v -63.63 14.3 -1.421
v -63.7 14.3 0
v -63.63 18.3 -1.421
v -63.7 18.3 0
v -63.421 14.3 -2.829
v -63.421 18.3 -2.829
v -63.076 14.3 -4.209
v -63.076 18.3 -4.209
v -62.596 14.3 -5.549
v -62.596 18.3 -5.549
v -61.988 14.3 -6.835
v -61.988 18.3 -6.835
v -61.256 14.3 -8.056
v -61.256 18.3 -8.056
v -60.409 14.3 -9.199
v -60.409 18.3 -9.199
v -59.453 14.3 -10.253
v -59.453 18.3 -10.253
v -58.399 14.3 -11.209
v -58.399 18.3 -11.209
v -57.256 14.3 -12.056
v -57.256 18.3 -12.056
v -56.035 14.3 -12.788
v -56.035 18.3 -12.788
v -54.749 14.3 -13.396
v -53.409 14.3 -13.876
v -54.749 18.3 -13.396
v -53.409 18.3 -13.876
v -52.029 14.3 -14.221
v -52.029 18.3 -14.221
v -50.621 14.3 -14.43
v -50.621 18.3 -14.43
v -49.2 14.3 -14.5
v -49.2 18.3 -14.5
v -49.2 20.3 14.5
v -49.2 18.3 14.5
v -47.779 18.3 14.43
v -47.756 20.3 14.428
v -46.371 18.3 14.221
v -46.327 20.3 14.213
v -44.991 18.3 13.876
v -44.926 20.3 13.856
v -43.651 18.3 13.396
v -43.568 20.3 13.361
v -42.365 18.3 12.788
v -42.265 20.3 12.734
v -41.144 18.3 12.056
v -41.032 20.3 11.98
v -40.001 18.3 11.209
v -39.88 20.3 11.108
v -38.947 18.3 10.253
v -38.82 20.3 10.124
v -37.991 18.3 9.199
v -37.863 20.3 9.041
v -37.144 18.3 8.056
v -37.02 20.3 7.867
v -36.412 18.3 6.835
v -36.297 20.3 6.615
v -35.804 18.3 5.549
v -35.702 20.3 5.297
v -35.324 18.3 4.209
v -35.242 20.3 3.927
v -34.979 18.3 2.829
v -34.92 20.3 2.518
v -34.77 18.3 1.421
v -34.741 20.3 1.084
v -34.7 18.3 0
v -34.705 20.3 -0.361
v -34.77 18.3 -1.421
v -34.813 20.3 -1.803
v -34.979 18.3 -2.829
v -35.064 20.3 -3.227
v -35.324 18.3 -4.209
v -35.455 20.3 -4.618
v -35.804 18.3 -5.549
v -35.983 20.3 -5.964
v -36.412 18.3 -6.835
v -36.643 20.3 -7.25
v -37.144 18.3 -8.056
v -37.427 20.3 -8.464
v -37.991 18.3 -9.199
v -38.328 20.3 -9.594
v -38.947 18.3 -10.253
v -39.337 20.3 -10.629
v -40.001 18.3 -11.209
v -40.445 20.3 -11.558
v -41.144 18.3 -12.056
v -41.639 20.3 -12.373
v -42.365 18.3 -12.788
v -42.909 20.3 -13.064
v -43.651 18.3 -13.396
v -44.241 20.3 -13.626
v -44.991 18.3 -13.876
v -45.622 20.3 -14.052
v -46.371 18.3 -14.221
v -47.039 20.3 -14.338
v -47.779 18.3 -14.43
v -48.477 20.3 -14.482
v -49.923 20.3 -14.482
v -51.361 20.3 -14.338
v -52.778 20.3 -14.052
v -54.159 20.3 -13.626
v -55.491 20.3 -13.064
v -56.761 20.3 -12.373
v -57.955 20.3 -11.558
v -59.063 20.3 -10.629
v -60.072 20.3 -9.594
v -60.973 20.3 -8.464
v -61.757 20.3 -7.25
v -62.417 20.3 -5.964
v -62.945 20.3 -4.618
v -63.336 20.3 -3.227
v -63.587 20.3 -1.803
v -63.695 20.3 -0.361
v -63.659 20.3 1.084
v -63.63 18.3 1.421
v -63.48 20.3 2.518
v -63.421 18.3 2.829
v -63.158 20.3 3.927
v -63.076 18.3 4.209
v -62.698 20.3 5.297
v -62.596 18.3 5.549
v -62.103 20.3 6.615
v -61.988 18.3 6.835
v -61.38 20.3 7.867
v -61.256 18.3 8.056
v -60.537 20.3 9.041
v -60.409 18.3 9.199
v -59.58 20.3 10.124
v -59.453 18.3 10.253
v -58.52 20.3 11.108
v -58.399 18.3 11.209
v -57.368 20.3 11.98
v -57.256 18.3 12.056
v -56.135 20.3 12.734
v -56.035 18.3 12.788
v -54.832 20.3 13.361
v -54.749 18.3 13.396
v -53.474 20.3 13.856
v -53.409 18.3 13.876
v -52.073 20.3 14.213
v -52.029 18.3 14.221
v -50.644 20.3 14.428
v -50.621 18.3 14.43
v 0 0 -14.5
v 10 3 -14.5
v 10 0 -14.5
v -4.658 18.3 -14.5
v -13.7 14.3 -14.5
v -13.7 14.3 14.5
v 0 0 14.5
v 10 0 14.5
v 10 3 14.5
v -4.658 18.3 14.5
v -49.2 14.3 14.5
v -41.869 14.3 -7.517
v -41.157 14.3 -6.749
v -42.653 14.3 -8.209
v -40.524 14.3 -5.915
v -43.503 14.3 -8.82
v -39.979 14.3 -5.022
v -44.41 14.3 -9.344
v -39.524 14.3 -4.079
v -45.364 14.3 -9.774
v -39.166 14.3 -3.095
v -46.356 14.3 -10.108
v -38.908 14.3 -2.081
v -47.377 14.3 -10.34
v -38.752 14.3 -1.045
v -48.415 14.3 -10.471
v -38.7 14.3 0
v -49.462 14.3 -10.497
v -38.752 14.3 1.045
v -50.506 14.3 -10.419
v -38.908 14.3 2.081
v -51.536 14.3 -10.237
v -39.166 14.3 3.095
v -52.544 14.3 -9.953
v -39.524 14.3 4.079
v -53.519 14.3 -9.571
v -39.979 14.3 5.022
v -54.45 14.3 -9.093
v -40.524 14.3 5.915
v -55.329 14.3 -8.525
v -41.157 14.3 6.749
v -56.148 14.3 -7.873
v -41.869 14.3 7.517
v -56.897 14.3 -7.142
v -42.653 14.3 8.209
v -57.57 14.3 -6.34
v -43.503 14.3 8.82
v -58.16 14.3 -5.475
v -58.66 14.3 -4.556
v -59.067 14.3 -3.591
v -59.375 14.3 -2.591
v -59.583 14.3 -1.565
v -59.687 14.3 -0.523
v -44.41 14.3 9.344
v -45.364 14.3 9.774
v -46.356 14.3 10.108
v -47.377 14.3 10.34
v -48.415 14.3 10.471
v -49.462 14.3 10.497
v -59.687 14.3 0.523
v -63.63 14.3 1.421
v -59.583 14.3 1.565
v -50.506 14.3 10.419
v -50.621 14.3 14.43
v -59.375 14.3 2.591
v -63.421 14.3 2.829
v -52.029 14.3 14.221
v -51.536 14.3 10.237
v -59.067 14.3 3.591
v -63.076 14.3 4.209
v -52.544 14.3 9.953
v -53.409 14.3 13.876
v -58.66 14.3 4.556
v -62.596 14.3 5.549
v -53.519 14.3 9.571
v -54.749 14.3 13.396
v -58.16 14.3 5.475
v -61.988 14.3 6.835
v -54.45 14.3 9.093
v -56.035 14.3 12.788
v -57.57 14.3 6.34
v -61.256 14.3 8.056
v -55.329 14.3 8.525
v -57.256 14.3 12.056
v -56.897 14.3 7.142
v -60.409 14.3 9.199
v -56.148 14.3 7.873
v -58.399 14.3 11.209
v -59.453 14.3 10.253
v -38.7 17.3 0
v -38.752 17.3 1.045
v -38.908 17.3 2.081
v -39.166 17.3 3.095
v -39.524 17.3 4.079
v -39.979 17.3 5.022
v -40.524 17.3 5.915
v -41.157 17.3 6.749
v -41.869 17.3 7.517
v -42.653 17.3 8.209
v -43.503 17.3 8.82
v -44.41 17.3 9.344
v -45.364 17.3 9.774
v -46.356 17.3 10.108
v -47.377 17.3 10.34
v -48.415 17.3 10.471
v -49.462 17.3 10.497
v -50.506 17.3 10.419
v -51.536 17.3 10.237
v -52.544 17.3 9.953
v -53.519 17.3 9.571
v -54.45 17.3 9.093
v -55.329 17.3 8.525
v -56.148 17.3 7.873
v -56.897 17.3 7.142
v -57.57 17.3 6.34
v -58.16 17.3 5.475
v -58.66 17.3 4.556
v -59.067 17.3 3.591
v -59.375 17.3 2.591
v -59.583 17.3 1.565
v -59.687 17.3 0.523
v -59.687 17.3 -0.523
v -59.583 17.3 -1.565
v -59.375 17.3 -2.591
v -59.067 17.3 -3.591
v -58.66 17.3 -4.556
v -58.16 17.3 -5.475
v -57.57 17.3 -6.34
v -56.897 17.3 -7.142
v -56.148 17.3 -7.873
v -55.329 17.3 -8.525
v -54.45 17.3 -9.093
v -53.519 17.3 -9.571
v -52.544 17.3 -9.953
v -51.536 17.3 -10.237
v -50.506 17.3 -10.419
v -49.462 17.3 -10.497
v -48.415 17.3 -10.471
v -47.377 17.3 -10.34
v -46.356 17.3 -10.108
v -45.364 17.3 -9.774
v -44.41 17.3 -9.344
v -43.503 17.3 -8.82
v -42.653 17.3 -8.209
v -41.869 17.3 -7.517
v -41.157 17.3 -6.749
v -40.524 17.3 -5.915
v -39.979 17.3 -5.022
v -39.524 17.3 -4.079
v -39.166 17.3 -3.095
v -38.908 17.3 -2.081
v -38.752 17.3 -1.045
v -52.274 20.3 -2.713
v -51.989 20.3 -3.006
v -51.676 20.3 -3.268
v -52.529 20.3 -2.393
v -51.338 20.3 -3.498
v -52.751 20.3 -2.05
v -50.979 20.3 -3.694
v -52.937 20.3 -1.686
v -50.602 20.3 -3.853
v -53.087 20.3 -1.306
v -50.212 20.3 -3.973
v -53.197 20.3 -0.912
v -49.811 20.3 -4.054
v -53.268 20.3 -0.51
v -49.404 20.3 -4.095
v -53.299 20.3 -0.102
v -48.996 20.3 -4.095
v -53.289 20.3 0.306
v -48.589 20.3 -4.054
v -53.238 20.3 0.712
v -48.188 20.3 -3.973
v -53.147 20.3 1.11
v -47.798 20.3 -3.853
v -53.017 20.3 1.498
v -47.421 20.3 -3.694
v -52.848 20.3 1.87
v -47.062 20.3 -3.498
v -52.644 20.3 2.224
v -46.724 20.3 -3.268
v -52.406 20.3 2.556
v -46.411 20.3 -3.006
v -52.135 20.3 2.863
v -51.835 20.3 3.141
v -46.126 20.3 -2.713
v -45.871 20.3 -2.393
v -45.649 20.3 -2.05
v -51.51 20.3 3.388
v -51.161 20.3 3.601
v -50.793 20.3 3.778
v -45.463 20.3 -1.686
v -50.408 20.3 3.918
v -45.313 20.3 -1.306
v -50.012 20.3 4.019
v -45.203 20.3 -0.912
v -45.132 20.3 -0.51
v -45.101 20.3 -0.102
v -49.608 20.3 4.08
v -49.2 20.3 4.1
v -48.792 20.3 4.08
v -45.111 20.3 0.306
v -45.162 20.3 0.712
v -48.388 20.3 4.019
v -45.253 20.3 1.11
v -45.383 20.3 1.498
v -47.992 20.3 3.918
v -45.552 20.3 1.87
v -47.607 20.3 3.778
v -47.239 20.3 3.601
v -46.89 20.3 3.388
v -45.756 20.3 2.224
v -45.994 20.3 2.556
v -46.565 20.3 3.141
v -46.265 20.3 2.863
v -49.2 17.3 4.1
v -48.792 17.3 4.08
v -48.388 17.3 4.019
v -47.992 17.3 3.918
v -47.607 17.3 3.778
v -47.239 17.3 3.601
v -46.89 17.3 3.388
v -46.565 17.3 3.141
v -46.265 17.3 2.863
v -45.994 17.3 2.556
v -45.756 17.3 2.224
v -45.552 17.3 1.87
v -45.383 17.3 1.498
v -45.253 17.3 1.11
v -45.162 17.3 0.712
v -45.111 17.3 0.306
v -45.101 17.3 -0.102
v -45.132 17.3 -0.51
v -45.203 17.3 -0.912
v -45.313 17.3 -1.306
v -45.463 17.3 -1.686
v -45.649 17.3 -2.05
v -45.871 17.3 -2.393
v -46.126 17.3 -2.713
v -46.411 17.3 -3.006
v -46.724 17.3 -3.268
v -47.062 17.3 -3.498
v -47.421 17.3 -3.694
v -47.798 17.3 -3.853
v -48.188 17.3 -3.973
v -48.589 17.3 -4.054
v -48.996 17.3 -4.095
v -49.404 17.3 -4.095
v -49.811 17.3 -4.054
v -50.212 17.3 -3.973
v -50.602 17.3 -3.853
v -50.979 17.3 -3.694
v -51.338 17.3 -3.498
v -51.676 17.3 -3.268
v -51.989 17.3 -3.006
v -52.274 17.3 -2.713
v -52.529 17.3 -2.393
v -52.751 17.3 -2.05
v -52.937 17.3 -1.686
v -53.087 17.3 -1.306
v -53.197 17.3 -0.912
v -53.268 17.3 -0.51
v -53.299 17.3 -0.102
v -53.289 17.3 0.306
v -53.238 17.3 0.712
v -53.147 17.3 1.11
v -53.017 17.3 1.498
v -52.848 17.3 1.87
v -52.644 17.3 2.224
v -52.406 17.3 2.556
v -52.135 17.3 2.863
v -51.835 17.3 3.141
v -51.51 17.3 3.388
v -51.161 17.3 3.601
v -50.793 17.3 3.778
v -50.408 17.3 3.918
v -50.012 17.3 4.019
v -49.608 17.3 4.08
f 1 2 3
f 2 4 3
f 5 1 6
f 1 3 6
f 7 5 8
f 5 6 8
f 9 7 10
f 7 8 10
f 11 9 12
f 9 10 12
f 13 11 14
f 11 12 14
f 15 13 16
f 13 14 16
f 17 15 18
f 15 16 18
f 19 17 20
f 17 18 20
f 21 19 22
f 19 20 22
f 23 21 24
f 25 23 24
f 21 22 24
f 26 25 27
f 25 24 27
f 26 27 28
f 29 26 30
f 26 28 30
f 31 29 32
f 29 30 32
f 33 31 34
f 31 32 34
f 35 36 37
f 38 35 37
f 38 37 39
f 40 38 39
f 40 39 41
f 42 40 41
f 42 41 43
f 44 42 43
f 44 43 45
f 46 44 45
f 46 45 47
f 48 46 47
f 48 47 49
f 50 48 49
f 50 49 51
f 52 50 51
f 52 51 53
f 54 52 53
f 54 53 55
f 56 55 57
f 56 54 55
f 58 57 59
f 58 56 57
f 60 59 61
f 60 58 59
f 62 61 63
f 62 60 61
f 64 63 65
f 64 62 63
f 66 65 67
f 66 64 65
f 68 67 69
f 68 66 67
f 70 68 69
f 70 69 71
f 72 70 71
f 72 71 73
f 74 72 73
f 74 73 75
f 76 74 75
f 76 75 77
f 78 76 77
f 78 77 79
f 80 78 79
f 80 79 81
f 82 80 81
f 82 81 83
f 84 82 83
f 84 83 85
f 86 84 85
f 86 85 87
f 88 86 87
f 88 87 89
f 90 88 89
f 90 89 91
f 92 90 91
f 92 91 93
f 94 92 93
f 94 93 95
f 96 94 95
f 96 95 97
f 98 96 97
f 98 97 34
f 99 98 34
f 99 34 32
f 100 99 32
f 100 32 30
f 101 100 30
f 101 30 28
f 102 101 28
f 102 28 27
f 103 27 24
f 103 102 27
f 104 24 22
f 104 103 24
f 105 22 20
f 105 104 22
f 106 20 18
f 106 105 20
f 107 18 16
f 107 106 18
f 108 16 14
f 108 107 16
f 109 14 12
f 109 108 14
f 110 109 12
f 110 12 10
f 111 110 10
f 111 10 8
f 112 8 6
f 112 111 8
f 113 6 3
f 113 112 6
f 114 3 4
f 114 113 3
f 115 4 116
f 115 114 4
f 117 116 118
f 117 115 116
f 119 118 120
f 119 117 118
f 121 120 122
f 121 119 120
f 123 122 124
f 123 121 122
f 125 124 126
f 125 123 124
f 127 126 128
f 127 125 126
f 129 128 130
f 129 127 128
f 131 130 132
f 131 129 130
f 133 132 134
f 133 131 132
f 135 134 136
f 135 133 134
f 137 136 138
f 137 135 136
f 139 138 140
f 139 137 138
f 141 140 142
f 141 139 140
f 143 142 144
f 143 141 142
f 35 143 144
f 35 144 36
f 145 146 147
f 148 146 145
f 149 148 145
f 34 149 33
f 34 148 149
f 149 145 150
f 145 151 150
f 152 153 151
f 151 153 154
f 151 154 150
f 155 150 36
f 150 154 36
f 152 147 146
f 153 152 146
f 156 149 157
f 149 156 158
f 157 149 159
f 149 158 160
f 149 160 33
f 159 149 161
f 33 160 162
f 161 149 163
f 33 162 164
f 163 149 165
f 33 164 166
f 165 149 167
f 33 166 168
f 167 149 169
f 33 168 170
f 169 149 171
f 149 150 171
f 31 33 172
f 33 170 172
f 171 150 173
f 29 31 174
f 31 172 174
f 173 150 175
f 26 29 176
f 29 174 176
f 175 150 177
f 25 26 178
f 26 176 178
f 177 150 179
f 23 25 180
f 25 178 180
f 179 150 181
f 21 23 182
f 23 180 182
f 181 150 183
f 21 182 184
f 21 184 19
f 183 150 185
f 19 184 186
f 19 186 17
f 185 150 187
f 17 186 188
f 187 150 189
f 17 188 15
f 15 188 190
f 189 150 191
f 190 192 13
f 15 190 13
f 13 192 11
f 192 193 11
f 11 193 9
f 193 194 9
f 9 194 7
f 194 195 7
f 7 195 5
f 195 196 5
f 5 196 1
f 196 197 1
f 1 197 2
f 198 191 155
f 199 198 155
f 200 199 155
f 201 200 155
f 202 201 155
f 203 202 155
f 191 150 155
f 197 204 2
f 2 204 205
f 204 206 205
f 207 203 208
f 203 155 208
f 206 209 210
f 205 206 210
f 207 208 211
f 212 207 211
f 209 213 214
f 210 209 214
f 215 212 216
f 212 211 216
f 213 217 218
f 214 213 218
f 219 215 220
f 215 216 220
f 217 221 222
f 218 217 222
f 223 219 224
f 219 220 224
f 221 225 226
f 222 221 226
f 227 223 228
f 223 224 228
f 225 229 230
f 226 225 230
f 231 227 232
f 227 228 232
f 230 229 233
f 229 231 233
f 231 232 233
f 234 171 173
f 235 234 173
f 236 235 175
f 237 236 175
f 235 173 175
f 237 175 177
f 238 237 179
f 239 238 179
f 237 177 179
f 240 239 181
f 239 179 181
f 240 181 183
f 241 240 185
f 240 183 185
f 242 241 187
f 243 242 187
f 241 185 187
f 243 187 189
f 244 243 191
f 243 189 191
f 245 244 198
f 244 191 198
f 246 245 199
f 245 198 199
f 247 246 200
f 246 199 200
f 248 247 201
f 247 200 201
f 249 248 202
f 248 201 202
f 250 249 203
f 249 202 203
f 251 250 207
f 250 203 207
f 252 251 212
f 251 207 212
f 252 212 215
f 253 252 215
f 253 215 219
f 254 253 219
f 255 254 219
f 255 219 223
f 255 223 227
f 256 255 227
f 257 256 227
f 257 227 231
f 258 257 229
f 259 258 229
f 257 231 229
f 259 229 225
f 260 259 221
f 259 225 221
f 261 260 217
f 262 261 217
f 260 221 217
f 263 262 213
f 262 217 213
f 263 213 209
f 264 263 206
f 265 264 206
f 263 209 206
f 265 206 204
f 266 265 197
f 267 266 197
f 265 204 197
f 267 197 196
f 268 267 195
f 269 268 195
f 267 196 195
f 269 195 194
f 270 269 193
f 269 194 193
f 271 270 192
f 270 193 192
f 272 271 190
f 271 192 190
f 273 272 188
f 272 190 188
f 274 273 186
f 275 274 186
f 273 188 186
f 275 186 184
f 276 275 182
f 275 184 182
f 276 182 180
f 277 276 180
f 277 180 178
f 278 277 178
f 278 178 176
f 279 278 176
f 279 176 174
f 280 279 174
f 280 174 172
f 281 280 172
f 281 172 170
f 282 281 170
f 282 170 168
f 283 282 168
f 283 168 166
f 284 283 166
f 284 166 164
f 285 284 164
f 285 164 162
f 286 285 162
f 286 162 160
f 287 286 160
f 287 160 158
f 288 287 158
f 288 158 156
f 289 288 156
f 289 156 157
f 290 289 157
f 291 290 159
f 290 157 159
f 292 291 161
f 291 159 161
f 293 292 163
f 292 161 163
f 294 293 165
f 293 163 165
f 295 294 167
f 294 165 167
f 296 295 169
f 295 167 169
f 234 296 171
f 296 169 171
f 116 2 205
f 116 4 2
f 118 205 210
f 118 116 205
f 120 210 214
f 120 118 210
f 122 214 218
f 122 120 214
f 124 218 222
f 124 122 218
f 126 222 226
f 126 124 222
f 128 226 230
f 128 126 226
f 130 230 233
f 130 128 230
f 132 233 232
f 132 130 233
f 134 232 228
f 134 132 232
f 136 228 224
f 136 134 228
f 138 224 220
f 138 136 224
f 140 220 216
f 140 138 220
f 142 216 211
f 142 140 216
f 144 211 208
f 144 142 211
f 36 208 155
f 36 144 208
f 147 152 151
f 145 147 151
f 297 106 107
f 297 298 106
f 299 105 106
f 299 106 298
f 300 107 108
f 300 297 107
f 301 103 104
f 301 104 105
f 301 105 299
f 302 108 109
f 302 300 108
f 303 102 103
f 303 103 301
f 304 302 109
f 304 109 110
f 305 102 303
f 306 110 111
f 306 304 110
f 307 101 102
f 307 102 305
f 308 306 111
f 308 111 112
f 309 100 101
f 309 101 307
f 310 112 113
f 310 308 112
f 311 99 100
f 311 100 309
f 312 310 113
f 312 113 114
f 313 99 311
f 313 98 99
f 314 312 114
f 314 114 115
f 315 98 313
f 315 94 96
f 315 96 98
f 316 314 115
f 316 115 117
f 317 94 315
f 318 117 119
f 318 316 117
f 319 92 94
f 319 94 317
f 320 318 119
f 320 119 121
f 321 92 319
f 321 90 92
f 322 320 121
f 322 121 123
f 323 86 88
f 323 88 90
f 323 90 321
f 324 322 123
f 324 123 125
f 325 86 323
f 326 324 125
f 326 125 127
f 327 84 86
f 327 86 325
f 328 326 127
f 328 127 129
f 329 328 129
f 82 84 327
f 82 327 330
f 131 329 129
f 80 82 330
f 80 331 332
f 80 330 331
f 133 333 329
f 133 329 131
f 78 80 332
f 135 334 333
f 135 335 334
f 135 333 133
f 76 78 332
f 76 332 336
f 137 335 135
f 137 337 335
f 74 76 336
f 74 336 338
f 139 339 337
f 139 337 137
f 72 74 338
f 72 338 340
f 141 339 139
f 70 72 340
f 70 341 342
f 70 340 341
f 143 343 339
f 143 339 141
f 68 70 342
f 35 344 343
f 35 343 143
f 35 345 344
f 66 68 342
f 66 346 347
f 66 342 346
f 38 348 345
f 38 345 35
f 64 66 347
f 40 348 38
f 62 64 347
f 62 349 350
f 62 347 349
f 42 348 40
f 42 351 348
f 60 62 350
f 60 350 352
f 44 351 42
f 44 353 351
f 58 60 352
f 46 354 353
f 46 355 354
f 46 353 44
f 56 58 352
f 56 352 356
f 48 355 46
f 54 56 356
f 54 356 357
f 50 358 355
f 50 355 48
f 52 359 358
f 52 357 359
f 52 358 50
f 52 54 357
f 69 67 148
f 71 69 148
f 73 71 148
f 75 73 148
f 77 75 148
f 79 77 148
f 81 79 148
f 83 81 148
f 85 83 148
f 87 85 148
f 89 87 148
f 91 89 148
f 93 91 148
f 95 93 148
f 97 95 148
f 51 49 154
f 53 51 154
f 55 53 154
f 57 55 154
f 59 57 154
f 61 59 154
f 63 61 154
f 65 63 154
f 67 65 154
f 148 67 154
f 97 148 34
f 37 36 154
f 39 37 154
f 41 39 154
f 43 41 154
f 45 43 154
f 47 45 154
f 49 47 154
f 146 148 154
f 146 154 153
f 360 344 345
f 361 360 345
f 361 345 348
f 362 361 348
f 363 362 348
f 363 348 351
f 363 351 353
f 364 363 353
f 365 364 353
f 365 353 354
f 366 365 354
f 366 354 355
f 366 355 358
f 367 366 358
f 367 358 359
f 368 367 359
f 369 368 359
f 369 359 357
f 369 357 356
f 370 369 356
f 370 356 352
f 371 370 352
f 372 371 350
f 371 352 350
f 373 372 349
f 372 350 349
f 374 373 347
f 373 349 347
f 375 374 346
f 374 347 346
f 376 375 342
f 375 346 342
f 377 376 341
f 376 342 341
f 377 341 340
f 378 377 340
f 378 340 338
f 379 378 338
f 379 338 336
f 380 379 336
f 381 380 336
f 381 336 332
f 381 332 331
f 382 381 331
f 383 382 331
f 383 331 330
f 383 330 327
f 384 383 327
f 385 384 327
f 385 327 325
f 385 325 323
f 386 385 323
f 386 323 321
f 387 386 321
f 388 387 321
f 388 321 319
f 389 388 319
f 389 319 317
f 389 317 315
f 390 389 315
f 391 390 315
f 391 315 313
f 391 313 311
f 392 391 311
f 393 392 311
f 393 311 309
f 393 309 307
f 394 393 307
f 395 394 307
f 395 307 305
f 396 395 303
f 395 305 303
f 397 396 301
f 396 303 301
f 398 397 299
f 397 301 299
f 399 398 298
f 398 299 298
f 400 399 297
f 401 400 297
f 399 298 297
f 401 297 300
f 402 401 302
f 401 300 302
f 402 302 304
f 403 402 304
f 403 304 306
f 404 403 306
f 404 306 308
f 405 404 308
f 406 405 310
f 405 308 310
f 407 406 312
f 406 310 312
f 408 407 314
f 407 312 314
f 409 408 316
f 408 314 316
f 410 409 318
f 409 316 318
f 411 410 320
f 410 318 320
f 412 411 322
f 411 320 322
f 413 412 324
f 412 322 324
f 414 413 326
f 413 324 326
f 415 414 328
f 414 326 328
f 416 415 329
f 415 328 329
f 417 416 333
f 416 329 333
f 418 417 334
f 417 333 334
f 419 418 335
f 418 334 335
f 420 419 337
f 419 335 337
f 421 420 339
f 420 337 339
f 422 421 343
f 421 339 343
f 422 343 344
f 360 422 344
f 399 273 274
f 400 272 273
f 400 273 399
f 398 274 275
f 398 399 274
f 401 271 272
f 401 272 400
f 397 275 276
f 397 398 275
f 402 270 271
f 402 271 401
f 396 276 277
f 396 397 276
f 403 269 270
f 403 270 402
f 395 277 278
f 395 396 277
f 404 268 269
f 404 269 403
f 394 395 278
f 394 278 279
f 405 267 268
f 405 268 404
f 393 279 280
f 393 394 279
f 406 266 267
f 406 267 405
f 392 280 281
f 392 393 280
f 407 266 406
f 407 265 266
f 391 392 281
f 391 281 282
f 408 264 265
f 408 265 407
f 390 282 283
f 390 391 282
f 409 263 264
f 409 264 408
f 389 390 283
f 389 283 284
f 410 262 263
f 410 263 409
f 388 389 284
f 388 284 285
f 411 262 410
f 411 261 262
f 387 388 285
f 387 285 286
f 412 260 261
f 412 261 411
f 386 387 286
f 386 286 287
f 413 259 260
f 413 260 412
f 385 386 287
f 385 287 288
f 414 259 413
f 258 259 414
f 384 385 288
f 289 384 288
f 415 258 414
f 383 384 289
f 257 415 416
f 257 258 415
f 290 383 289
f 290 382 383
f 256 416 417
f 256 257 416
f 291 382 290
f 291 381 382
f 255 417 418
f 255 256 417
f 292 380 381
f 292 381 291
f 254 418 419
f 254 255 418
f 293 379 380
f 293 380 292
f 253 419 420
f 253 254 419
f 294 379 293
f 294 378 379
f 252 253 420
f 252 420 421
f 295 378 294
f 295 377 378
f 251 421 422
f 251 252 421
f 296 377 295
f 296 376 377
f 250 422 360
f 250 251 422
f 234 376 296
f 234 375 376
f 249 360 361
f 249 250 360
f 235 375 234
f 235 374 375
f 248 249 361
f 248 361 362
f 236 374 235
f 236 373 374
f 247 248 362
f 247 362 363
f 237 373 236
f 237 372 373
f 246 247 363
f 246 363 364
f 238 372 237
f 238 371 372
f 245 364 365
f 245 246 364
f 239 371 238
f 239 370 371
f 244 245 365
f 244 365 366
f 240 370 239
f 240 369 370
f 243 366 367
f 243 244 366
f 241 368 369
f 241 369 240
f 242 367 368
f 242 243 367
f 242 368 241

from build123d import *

# Parameters (mm, degrees)
BOSS_EXTRUDE1_DEPTH = 14.5
SKETCH3_R           = 4.1
CUT_EXTRUDE1_DEPTH  = 4
BOSS_EXTRUDE2_START = 2
SKETCH5_R           = 14.5
SKETCH5_R_2         = 4.1
BOSS_EXTRUDE2_DEPTH = 2
SKETCH6_R           = 1.55
CUT_EXTRUDE3_DEPTH  = 3
SKETCH7_R           = 10.5
CUT_EXTRUDE4_DEPTH  = 3
FILLET1_R           = 14.5
CUT_EXTRUDE5_DEPTH  = 3
SKETCH9_R           = 1.55
CUT_EXTRUDE6_DEPTH  = 3
SKETCH10_R          = 3
CUT_EXTRUDE7_DEPTH  = 2
SKETCH13_W          = 33
SKETCH13_H          = 3
CUT_EXTRUDE8_DEPTH  = 29


with BuildPart() as part:
    # Sketch2 → Boss-Extrude1 (new, symmetric)
    with BuildSketch(Plane.XY):
        Polygon((-63.7, 18.3), (-4.658041958, 18.3), (10, 3), (43, 3), (43, 0), (0, 0), (-13.7, 14.3), (-63.7, 14.3), align=None)
    extrude(amount=BOSS_EXTRUDE1_DEPTH, both=True)

    # Sketch3 → Cut-Extrude1 (cut)
    with BuildSketch(Plane(origin=(0, 18.3, 0), x_dir=(1, 0, 0), z_dir=(0, 1, 0))):
        with Locations(Location((-49.2, 0, 0), (0, 0, 270))):
            Circle(SKETCH3_R)
    extrude(amount=-CUT_EXTRUDE1_DEPTH, mode=Mode.SUBTRACT)

    # Sketch5 → Boss-Extrude2 (add)
    with BuildSketch(Plane(origin=(0, 18.3, 0), x_dir=(1, 0, 0), z_dir=(0, 1, 0)).offset(BOSS_EXTRUDE2_START)):
        with Locations(Location((-49.2, 0, 0), (0, 0, 270))):
            Circle(SKETCH5_R)
        with Locations(Location((-49.2, 0, 0), (0, 0, 270))):
            Circle(SKETCH5_R_2, mode=Mode.SUBTRACT)
    extrude(amount=-BOSS_EXTRUDE2_DEPTH)

    # Sketch6 → Cut-Extrude3 (cut)
    with BuildSketch(Plane(origin=(0, 3, 0), x_dir=(1, 0, 0), z_dir=(0, 1, 0))):
        with Locations(Location((22.248092992, -5.560176775, 0), (0, 0, 180))):
            Circle(SKETCH6_R)
        with Locations(Location((33.751907008, 5.560176775, 0), (0, 0, 180))):
            Circle(SKETCH6_R)
    extrude(amount=-CUT_EXTRUDE3_DEPTH, mode=Mode.SUBTRACT)

    # Sketch7 → Cut-Extrude4 (cut)
    with BuildSketch(Plane.XZ.offset(-14.3)):
        with Locations((-49.2, 0)):
            Circle(SKETCH7_R)
    extrude(amount=-CUT_EXTRUDE4_DEPTH, mode=Mode.SUBTRACT)

    # Fillet1
    fillet1_edges = [part.edges().sort_by_distance(p)[0] for p in [
        (-63.7, 16.3, -14.5),
        (-63.7, 16.3, 14.5),
    ]]
    fillet(fillet1_edges, radius=FILLET1_R - 0.0001)  # a hair under: the kernel refuses the full size

    # Sketch8 → Cut-Extrude5 (cut)
    with BuildSketch(Plane(origin=(0, 3, 0), x_dir=(1, 0, 0), z_dir=(0, 1, 0))):
        Polygon((16, -3.5), (10, -14.5), (16, -14.5), (43, -14.5), (43, -3.5), align=None)
    extrude(amount=-CUT_EXTRUDE5_DEPTH, mode=Mode.SUBTRACT)

    # Sketch9 → Cut-Extrude6 (cut)
    with BuildSketch(Plane(origin=(0, 3, 0), x_dir=(1, 0, 0), z_dir=(0, 1, 0))):
        with Locations(Location((22.251907008, 5.560176775, 0), (0, 0, 270))):
            Circle(SKETCH9_R)
    extrude(amount=-CUT_EXTRUDE6_DEPTH, mode=Mode.SUBTRACT)

    # Sketch10 → Cut-Extrude7 (cut)
    with BuildSketch(Plane.XZ):
        with Locations((22.251907008, -5.560176775)):
            Circle(SKETCH10_R)
        with Locations((33.751907008, -5.560176775)):
            Circle(SKETCH10_R)
    extrude(amount=-CUT_EXTRUDE7_DEPTH, mode=Mode.SUBTRACT)

    # Sketch13 → Cut-Extrude8 (cut)
    with BuildSketch(Plane(origin=(0, 0, -14.5), x_dir=(-1, 0, 0), z_dir=(0, 0, -1))):
        with Locations((-26.5, 1.5)):
            Rectangle(SKETCH13_W, SKETCH13_H)
    extrude(amount=-CUT_EXTRUDE8_DEPTH, mode=Mode.SUBTRACT)


solid = part.part
